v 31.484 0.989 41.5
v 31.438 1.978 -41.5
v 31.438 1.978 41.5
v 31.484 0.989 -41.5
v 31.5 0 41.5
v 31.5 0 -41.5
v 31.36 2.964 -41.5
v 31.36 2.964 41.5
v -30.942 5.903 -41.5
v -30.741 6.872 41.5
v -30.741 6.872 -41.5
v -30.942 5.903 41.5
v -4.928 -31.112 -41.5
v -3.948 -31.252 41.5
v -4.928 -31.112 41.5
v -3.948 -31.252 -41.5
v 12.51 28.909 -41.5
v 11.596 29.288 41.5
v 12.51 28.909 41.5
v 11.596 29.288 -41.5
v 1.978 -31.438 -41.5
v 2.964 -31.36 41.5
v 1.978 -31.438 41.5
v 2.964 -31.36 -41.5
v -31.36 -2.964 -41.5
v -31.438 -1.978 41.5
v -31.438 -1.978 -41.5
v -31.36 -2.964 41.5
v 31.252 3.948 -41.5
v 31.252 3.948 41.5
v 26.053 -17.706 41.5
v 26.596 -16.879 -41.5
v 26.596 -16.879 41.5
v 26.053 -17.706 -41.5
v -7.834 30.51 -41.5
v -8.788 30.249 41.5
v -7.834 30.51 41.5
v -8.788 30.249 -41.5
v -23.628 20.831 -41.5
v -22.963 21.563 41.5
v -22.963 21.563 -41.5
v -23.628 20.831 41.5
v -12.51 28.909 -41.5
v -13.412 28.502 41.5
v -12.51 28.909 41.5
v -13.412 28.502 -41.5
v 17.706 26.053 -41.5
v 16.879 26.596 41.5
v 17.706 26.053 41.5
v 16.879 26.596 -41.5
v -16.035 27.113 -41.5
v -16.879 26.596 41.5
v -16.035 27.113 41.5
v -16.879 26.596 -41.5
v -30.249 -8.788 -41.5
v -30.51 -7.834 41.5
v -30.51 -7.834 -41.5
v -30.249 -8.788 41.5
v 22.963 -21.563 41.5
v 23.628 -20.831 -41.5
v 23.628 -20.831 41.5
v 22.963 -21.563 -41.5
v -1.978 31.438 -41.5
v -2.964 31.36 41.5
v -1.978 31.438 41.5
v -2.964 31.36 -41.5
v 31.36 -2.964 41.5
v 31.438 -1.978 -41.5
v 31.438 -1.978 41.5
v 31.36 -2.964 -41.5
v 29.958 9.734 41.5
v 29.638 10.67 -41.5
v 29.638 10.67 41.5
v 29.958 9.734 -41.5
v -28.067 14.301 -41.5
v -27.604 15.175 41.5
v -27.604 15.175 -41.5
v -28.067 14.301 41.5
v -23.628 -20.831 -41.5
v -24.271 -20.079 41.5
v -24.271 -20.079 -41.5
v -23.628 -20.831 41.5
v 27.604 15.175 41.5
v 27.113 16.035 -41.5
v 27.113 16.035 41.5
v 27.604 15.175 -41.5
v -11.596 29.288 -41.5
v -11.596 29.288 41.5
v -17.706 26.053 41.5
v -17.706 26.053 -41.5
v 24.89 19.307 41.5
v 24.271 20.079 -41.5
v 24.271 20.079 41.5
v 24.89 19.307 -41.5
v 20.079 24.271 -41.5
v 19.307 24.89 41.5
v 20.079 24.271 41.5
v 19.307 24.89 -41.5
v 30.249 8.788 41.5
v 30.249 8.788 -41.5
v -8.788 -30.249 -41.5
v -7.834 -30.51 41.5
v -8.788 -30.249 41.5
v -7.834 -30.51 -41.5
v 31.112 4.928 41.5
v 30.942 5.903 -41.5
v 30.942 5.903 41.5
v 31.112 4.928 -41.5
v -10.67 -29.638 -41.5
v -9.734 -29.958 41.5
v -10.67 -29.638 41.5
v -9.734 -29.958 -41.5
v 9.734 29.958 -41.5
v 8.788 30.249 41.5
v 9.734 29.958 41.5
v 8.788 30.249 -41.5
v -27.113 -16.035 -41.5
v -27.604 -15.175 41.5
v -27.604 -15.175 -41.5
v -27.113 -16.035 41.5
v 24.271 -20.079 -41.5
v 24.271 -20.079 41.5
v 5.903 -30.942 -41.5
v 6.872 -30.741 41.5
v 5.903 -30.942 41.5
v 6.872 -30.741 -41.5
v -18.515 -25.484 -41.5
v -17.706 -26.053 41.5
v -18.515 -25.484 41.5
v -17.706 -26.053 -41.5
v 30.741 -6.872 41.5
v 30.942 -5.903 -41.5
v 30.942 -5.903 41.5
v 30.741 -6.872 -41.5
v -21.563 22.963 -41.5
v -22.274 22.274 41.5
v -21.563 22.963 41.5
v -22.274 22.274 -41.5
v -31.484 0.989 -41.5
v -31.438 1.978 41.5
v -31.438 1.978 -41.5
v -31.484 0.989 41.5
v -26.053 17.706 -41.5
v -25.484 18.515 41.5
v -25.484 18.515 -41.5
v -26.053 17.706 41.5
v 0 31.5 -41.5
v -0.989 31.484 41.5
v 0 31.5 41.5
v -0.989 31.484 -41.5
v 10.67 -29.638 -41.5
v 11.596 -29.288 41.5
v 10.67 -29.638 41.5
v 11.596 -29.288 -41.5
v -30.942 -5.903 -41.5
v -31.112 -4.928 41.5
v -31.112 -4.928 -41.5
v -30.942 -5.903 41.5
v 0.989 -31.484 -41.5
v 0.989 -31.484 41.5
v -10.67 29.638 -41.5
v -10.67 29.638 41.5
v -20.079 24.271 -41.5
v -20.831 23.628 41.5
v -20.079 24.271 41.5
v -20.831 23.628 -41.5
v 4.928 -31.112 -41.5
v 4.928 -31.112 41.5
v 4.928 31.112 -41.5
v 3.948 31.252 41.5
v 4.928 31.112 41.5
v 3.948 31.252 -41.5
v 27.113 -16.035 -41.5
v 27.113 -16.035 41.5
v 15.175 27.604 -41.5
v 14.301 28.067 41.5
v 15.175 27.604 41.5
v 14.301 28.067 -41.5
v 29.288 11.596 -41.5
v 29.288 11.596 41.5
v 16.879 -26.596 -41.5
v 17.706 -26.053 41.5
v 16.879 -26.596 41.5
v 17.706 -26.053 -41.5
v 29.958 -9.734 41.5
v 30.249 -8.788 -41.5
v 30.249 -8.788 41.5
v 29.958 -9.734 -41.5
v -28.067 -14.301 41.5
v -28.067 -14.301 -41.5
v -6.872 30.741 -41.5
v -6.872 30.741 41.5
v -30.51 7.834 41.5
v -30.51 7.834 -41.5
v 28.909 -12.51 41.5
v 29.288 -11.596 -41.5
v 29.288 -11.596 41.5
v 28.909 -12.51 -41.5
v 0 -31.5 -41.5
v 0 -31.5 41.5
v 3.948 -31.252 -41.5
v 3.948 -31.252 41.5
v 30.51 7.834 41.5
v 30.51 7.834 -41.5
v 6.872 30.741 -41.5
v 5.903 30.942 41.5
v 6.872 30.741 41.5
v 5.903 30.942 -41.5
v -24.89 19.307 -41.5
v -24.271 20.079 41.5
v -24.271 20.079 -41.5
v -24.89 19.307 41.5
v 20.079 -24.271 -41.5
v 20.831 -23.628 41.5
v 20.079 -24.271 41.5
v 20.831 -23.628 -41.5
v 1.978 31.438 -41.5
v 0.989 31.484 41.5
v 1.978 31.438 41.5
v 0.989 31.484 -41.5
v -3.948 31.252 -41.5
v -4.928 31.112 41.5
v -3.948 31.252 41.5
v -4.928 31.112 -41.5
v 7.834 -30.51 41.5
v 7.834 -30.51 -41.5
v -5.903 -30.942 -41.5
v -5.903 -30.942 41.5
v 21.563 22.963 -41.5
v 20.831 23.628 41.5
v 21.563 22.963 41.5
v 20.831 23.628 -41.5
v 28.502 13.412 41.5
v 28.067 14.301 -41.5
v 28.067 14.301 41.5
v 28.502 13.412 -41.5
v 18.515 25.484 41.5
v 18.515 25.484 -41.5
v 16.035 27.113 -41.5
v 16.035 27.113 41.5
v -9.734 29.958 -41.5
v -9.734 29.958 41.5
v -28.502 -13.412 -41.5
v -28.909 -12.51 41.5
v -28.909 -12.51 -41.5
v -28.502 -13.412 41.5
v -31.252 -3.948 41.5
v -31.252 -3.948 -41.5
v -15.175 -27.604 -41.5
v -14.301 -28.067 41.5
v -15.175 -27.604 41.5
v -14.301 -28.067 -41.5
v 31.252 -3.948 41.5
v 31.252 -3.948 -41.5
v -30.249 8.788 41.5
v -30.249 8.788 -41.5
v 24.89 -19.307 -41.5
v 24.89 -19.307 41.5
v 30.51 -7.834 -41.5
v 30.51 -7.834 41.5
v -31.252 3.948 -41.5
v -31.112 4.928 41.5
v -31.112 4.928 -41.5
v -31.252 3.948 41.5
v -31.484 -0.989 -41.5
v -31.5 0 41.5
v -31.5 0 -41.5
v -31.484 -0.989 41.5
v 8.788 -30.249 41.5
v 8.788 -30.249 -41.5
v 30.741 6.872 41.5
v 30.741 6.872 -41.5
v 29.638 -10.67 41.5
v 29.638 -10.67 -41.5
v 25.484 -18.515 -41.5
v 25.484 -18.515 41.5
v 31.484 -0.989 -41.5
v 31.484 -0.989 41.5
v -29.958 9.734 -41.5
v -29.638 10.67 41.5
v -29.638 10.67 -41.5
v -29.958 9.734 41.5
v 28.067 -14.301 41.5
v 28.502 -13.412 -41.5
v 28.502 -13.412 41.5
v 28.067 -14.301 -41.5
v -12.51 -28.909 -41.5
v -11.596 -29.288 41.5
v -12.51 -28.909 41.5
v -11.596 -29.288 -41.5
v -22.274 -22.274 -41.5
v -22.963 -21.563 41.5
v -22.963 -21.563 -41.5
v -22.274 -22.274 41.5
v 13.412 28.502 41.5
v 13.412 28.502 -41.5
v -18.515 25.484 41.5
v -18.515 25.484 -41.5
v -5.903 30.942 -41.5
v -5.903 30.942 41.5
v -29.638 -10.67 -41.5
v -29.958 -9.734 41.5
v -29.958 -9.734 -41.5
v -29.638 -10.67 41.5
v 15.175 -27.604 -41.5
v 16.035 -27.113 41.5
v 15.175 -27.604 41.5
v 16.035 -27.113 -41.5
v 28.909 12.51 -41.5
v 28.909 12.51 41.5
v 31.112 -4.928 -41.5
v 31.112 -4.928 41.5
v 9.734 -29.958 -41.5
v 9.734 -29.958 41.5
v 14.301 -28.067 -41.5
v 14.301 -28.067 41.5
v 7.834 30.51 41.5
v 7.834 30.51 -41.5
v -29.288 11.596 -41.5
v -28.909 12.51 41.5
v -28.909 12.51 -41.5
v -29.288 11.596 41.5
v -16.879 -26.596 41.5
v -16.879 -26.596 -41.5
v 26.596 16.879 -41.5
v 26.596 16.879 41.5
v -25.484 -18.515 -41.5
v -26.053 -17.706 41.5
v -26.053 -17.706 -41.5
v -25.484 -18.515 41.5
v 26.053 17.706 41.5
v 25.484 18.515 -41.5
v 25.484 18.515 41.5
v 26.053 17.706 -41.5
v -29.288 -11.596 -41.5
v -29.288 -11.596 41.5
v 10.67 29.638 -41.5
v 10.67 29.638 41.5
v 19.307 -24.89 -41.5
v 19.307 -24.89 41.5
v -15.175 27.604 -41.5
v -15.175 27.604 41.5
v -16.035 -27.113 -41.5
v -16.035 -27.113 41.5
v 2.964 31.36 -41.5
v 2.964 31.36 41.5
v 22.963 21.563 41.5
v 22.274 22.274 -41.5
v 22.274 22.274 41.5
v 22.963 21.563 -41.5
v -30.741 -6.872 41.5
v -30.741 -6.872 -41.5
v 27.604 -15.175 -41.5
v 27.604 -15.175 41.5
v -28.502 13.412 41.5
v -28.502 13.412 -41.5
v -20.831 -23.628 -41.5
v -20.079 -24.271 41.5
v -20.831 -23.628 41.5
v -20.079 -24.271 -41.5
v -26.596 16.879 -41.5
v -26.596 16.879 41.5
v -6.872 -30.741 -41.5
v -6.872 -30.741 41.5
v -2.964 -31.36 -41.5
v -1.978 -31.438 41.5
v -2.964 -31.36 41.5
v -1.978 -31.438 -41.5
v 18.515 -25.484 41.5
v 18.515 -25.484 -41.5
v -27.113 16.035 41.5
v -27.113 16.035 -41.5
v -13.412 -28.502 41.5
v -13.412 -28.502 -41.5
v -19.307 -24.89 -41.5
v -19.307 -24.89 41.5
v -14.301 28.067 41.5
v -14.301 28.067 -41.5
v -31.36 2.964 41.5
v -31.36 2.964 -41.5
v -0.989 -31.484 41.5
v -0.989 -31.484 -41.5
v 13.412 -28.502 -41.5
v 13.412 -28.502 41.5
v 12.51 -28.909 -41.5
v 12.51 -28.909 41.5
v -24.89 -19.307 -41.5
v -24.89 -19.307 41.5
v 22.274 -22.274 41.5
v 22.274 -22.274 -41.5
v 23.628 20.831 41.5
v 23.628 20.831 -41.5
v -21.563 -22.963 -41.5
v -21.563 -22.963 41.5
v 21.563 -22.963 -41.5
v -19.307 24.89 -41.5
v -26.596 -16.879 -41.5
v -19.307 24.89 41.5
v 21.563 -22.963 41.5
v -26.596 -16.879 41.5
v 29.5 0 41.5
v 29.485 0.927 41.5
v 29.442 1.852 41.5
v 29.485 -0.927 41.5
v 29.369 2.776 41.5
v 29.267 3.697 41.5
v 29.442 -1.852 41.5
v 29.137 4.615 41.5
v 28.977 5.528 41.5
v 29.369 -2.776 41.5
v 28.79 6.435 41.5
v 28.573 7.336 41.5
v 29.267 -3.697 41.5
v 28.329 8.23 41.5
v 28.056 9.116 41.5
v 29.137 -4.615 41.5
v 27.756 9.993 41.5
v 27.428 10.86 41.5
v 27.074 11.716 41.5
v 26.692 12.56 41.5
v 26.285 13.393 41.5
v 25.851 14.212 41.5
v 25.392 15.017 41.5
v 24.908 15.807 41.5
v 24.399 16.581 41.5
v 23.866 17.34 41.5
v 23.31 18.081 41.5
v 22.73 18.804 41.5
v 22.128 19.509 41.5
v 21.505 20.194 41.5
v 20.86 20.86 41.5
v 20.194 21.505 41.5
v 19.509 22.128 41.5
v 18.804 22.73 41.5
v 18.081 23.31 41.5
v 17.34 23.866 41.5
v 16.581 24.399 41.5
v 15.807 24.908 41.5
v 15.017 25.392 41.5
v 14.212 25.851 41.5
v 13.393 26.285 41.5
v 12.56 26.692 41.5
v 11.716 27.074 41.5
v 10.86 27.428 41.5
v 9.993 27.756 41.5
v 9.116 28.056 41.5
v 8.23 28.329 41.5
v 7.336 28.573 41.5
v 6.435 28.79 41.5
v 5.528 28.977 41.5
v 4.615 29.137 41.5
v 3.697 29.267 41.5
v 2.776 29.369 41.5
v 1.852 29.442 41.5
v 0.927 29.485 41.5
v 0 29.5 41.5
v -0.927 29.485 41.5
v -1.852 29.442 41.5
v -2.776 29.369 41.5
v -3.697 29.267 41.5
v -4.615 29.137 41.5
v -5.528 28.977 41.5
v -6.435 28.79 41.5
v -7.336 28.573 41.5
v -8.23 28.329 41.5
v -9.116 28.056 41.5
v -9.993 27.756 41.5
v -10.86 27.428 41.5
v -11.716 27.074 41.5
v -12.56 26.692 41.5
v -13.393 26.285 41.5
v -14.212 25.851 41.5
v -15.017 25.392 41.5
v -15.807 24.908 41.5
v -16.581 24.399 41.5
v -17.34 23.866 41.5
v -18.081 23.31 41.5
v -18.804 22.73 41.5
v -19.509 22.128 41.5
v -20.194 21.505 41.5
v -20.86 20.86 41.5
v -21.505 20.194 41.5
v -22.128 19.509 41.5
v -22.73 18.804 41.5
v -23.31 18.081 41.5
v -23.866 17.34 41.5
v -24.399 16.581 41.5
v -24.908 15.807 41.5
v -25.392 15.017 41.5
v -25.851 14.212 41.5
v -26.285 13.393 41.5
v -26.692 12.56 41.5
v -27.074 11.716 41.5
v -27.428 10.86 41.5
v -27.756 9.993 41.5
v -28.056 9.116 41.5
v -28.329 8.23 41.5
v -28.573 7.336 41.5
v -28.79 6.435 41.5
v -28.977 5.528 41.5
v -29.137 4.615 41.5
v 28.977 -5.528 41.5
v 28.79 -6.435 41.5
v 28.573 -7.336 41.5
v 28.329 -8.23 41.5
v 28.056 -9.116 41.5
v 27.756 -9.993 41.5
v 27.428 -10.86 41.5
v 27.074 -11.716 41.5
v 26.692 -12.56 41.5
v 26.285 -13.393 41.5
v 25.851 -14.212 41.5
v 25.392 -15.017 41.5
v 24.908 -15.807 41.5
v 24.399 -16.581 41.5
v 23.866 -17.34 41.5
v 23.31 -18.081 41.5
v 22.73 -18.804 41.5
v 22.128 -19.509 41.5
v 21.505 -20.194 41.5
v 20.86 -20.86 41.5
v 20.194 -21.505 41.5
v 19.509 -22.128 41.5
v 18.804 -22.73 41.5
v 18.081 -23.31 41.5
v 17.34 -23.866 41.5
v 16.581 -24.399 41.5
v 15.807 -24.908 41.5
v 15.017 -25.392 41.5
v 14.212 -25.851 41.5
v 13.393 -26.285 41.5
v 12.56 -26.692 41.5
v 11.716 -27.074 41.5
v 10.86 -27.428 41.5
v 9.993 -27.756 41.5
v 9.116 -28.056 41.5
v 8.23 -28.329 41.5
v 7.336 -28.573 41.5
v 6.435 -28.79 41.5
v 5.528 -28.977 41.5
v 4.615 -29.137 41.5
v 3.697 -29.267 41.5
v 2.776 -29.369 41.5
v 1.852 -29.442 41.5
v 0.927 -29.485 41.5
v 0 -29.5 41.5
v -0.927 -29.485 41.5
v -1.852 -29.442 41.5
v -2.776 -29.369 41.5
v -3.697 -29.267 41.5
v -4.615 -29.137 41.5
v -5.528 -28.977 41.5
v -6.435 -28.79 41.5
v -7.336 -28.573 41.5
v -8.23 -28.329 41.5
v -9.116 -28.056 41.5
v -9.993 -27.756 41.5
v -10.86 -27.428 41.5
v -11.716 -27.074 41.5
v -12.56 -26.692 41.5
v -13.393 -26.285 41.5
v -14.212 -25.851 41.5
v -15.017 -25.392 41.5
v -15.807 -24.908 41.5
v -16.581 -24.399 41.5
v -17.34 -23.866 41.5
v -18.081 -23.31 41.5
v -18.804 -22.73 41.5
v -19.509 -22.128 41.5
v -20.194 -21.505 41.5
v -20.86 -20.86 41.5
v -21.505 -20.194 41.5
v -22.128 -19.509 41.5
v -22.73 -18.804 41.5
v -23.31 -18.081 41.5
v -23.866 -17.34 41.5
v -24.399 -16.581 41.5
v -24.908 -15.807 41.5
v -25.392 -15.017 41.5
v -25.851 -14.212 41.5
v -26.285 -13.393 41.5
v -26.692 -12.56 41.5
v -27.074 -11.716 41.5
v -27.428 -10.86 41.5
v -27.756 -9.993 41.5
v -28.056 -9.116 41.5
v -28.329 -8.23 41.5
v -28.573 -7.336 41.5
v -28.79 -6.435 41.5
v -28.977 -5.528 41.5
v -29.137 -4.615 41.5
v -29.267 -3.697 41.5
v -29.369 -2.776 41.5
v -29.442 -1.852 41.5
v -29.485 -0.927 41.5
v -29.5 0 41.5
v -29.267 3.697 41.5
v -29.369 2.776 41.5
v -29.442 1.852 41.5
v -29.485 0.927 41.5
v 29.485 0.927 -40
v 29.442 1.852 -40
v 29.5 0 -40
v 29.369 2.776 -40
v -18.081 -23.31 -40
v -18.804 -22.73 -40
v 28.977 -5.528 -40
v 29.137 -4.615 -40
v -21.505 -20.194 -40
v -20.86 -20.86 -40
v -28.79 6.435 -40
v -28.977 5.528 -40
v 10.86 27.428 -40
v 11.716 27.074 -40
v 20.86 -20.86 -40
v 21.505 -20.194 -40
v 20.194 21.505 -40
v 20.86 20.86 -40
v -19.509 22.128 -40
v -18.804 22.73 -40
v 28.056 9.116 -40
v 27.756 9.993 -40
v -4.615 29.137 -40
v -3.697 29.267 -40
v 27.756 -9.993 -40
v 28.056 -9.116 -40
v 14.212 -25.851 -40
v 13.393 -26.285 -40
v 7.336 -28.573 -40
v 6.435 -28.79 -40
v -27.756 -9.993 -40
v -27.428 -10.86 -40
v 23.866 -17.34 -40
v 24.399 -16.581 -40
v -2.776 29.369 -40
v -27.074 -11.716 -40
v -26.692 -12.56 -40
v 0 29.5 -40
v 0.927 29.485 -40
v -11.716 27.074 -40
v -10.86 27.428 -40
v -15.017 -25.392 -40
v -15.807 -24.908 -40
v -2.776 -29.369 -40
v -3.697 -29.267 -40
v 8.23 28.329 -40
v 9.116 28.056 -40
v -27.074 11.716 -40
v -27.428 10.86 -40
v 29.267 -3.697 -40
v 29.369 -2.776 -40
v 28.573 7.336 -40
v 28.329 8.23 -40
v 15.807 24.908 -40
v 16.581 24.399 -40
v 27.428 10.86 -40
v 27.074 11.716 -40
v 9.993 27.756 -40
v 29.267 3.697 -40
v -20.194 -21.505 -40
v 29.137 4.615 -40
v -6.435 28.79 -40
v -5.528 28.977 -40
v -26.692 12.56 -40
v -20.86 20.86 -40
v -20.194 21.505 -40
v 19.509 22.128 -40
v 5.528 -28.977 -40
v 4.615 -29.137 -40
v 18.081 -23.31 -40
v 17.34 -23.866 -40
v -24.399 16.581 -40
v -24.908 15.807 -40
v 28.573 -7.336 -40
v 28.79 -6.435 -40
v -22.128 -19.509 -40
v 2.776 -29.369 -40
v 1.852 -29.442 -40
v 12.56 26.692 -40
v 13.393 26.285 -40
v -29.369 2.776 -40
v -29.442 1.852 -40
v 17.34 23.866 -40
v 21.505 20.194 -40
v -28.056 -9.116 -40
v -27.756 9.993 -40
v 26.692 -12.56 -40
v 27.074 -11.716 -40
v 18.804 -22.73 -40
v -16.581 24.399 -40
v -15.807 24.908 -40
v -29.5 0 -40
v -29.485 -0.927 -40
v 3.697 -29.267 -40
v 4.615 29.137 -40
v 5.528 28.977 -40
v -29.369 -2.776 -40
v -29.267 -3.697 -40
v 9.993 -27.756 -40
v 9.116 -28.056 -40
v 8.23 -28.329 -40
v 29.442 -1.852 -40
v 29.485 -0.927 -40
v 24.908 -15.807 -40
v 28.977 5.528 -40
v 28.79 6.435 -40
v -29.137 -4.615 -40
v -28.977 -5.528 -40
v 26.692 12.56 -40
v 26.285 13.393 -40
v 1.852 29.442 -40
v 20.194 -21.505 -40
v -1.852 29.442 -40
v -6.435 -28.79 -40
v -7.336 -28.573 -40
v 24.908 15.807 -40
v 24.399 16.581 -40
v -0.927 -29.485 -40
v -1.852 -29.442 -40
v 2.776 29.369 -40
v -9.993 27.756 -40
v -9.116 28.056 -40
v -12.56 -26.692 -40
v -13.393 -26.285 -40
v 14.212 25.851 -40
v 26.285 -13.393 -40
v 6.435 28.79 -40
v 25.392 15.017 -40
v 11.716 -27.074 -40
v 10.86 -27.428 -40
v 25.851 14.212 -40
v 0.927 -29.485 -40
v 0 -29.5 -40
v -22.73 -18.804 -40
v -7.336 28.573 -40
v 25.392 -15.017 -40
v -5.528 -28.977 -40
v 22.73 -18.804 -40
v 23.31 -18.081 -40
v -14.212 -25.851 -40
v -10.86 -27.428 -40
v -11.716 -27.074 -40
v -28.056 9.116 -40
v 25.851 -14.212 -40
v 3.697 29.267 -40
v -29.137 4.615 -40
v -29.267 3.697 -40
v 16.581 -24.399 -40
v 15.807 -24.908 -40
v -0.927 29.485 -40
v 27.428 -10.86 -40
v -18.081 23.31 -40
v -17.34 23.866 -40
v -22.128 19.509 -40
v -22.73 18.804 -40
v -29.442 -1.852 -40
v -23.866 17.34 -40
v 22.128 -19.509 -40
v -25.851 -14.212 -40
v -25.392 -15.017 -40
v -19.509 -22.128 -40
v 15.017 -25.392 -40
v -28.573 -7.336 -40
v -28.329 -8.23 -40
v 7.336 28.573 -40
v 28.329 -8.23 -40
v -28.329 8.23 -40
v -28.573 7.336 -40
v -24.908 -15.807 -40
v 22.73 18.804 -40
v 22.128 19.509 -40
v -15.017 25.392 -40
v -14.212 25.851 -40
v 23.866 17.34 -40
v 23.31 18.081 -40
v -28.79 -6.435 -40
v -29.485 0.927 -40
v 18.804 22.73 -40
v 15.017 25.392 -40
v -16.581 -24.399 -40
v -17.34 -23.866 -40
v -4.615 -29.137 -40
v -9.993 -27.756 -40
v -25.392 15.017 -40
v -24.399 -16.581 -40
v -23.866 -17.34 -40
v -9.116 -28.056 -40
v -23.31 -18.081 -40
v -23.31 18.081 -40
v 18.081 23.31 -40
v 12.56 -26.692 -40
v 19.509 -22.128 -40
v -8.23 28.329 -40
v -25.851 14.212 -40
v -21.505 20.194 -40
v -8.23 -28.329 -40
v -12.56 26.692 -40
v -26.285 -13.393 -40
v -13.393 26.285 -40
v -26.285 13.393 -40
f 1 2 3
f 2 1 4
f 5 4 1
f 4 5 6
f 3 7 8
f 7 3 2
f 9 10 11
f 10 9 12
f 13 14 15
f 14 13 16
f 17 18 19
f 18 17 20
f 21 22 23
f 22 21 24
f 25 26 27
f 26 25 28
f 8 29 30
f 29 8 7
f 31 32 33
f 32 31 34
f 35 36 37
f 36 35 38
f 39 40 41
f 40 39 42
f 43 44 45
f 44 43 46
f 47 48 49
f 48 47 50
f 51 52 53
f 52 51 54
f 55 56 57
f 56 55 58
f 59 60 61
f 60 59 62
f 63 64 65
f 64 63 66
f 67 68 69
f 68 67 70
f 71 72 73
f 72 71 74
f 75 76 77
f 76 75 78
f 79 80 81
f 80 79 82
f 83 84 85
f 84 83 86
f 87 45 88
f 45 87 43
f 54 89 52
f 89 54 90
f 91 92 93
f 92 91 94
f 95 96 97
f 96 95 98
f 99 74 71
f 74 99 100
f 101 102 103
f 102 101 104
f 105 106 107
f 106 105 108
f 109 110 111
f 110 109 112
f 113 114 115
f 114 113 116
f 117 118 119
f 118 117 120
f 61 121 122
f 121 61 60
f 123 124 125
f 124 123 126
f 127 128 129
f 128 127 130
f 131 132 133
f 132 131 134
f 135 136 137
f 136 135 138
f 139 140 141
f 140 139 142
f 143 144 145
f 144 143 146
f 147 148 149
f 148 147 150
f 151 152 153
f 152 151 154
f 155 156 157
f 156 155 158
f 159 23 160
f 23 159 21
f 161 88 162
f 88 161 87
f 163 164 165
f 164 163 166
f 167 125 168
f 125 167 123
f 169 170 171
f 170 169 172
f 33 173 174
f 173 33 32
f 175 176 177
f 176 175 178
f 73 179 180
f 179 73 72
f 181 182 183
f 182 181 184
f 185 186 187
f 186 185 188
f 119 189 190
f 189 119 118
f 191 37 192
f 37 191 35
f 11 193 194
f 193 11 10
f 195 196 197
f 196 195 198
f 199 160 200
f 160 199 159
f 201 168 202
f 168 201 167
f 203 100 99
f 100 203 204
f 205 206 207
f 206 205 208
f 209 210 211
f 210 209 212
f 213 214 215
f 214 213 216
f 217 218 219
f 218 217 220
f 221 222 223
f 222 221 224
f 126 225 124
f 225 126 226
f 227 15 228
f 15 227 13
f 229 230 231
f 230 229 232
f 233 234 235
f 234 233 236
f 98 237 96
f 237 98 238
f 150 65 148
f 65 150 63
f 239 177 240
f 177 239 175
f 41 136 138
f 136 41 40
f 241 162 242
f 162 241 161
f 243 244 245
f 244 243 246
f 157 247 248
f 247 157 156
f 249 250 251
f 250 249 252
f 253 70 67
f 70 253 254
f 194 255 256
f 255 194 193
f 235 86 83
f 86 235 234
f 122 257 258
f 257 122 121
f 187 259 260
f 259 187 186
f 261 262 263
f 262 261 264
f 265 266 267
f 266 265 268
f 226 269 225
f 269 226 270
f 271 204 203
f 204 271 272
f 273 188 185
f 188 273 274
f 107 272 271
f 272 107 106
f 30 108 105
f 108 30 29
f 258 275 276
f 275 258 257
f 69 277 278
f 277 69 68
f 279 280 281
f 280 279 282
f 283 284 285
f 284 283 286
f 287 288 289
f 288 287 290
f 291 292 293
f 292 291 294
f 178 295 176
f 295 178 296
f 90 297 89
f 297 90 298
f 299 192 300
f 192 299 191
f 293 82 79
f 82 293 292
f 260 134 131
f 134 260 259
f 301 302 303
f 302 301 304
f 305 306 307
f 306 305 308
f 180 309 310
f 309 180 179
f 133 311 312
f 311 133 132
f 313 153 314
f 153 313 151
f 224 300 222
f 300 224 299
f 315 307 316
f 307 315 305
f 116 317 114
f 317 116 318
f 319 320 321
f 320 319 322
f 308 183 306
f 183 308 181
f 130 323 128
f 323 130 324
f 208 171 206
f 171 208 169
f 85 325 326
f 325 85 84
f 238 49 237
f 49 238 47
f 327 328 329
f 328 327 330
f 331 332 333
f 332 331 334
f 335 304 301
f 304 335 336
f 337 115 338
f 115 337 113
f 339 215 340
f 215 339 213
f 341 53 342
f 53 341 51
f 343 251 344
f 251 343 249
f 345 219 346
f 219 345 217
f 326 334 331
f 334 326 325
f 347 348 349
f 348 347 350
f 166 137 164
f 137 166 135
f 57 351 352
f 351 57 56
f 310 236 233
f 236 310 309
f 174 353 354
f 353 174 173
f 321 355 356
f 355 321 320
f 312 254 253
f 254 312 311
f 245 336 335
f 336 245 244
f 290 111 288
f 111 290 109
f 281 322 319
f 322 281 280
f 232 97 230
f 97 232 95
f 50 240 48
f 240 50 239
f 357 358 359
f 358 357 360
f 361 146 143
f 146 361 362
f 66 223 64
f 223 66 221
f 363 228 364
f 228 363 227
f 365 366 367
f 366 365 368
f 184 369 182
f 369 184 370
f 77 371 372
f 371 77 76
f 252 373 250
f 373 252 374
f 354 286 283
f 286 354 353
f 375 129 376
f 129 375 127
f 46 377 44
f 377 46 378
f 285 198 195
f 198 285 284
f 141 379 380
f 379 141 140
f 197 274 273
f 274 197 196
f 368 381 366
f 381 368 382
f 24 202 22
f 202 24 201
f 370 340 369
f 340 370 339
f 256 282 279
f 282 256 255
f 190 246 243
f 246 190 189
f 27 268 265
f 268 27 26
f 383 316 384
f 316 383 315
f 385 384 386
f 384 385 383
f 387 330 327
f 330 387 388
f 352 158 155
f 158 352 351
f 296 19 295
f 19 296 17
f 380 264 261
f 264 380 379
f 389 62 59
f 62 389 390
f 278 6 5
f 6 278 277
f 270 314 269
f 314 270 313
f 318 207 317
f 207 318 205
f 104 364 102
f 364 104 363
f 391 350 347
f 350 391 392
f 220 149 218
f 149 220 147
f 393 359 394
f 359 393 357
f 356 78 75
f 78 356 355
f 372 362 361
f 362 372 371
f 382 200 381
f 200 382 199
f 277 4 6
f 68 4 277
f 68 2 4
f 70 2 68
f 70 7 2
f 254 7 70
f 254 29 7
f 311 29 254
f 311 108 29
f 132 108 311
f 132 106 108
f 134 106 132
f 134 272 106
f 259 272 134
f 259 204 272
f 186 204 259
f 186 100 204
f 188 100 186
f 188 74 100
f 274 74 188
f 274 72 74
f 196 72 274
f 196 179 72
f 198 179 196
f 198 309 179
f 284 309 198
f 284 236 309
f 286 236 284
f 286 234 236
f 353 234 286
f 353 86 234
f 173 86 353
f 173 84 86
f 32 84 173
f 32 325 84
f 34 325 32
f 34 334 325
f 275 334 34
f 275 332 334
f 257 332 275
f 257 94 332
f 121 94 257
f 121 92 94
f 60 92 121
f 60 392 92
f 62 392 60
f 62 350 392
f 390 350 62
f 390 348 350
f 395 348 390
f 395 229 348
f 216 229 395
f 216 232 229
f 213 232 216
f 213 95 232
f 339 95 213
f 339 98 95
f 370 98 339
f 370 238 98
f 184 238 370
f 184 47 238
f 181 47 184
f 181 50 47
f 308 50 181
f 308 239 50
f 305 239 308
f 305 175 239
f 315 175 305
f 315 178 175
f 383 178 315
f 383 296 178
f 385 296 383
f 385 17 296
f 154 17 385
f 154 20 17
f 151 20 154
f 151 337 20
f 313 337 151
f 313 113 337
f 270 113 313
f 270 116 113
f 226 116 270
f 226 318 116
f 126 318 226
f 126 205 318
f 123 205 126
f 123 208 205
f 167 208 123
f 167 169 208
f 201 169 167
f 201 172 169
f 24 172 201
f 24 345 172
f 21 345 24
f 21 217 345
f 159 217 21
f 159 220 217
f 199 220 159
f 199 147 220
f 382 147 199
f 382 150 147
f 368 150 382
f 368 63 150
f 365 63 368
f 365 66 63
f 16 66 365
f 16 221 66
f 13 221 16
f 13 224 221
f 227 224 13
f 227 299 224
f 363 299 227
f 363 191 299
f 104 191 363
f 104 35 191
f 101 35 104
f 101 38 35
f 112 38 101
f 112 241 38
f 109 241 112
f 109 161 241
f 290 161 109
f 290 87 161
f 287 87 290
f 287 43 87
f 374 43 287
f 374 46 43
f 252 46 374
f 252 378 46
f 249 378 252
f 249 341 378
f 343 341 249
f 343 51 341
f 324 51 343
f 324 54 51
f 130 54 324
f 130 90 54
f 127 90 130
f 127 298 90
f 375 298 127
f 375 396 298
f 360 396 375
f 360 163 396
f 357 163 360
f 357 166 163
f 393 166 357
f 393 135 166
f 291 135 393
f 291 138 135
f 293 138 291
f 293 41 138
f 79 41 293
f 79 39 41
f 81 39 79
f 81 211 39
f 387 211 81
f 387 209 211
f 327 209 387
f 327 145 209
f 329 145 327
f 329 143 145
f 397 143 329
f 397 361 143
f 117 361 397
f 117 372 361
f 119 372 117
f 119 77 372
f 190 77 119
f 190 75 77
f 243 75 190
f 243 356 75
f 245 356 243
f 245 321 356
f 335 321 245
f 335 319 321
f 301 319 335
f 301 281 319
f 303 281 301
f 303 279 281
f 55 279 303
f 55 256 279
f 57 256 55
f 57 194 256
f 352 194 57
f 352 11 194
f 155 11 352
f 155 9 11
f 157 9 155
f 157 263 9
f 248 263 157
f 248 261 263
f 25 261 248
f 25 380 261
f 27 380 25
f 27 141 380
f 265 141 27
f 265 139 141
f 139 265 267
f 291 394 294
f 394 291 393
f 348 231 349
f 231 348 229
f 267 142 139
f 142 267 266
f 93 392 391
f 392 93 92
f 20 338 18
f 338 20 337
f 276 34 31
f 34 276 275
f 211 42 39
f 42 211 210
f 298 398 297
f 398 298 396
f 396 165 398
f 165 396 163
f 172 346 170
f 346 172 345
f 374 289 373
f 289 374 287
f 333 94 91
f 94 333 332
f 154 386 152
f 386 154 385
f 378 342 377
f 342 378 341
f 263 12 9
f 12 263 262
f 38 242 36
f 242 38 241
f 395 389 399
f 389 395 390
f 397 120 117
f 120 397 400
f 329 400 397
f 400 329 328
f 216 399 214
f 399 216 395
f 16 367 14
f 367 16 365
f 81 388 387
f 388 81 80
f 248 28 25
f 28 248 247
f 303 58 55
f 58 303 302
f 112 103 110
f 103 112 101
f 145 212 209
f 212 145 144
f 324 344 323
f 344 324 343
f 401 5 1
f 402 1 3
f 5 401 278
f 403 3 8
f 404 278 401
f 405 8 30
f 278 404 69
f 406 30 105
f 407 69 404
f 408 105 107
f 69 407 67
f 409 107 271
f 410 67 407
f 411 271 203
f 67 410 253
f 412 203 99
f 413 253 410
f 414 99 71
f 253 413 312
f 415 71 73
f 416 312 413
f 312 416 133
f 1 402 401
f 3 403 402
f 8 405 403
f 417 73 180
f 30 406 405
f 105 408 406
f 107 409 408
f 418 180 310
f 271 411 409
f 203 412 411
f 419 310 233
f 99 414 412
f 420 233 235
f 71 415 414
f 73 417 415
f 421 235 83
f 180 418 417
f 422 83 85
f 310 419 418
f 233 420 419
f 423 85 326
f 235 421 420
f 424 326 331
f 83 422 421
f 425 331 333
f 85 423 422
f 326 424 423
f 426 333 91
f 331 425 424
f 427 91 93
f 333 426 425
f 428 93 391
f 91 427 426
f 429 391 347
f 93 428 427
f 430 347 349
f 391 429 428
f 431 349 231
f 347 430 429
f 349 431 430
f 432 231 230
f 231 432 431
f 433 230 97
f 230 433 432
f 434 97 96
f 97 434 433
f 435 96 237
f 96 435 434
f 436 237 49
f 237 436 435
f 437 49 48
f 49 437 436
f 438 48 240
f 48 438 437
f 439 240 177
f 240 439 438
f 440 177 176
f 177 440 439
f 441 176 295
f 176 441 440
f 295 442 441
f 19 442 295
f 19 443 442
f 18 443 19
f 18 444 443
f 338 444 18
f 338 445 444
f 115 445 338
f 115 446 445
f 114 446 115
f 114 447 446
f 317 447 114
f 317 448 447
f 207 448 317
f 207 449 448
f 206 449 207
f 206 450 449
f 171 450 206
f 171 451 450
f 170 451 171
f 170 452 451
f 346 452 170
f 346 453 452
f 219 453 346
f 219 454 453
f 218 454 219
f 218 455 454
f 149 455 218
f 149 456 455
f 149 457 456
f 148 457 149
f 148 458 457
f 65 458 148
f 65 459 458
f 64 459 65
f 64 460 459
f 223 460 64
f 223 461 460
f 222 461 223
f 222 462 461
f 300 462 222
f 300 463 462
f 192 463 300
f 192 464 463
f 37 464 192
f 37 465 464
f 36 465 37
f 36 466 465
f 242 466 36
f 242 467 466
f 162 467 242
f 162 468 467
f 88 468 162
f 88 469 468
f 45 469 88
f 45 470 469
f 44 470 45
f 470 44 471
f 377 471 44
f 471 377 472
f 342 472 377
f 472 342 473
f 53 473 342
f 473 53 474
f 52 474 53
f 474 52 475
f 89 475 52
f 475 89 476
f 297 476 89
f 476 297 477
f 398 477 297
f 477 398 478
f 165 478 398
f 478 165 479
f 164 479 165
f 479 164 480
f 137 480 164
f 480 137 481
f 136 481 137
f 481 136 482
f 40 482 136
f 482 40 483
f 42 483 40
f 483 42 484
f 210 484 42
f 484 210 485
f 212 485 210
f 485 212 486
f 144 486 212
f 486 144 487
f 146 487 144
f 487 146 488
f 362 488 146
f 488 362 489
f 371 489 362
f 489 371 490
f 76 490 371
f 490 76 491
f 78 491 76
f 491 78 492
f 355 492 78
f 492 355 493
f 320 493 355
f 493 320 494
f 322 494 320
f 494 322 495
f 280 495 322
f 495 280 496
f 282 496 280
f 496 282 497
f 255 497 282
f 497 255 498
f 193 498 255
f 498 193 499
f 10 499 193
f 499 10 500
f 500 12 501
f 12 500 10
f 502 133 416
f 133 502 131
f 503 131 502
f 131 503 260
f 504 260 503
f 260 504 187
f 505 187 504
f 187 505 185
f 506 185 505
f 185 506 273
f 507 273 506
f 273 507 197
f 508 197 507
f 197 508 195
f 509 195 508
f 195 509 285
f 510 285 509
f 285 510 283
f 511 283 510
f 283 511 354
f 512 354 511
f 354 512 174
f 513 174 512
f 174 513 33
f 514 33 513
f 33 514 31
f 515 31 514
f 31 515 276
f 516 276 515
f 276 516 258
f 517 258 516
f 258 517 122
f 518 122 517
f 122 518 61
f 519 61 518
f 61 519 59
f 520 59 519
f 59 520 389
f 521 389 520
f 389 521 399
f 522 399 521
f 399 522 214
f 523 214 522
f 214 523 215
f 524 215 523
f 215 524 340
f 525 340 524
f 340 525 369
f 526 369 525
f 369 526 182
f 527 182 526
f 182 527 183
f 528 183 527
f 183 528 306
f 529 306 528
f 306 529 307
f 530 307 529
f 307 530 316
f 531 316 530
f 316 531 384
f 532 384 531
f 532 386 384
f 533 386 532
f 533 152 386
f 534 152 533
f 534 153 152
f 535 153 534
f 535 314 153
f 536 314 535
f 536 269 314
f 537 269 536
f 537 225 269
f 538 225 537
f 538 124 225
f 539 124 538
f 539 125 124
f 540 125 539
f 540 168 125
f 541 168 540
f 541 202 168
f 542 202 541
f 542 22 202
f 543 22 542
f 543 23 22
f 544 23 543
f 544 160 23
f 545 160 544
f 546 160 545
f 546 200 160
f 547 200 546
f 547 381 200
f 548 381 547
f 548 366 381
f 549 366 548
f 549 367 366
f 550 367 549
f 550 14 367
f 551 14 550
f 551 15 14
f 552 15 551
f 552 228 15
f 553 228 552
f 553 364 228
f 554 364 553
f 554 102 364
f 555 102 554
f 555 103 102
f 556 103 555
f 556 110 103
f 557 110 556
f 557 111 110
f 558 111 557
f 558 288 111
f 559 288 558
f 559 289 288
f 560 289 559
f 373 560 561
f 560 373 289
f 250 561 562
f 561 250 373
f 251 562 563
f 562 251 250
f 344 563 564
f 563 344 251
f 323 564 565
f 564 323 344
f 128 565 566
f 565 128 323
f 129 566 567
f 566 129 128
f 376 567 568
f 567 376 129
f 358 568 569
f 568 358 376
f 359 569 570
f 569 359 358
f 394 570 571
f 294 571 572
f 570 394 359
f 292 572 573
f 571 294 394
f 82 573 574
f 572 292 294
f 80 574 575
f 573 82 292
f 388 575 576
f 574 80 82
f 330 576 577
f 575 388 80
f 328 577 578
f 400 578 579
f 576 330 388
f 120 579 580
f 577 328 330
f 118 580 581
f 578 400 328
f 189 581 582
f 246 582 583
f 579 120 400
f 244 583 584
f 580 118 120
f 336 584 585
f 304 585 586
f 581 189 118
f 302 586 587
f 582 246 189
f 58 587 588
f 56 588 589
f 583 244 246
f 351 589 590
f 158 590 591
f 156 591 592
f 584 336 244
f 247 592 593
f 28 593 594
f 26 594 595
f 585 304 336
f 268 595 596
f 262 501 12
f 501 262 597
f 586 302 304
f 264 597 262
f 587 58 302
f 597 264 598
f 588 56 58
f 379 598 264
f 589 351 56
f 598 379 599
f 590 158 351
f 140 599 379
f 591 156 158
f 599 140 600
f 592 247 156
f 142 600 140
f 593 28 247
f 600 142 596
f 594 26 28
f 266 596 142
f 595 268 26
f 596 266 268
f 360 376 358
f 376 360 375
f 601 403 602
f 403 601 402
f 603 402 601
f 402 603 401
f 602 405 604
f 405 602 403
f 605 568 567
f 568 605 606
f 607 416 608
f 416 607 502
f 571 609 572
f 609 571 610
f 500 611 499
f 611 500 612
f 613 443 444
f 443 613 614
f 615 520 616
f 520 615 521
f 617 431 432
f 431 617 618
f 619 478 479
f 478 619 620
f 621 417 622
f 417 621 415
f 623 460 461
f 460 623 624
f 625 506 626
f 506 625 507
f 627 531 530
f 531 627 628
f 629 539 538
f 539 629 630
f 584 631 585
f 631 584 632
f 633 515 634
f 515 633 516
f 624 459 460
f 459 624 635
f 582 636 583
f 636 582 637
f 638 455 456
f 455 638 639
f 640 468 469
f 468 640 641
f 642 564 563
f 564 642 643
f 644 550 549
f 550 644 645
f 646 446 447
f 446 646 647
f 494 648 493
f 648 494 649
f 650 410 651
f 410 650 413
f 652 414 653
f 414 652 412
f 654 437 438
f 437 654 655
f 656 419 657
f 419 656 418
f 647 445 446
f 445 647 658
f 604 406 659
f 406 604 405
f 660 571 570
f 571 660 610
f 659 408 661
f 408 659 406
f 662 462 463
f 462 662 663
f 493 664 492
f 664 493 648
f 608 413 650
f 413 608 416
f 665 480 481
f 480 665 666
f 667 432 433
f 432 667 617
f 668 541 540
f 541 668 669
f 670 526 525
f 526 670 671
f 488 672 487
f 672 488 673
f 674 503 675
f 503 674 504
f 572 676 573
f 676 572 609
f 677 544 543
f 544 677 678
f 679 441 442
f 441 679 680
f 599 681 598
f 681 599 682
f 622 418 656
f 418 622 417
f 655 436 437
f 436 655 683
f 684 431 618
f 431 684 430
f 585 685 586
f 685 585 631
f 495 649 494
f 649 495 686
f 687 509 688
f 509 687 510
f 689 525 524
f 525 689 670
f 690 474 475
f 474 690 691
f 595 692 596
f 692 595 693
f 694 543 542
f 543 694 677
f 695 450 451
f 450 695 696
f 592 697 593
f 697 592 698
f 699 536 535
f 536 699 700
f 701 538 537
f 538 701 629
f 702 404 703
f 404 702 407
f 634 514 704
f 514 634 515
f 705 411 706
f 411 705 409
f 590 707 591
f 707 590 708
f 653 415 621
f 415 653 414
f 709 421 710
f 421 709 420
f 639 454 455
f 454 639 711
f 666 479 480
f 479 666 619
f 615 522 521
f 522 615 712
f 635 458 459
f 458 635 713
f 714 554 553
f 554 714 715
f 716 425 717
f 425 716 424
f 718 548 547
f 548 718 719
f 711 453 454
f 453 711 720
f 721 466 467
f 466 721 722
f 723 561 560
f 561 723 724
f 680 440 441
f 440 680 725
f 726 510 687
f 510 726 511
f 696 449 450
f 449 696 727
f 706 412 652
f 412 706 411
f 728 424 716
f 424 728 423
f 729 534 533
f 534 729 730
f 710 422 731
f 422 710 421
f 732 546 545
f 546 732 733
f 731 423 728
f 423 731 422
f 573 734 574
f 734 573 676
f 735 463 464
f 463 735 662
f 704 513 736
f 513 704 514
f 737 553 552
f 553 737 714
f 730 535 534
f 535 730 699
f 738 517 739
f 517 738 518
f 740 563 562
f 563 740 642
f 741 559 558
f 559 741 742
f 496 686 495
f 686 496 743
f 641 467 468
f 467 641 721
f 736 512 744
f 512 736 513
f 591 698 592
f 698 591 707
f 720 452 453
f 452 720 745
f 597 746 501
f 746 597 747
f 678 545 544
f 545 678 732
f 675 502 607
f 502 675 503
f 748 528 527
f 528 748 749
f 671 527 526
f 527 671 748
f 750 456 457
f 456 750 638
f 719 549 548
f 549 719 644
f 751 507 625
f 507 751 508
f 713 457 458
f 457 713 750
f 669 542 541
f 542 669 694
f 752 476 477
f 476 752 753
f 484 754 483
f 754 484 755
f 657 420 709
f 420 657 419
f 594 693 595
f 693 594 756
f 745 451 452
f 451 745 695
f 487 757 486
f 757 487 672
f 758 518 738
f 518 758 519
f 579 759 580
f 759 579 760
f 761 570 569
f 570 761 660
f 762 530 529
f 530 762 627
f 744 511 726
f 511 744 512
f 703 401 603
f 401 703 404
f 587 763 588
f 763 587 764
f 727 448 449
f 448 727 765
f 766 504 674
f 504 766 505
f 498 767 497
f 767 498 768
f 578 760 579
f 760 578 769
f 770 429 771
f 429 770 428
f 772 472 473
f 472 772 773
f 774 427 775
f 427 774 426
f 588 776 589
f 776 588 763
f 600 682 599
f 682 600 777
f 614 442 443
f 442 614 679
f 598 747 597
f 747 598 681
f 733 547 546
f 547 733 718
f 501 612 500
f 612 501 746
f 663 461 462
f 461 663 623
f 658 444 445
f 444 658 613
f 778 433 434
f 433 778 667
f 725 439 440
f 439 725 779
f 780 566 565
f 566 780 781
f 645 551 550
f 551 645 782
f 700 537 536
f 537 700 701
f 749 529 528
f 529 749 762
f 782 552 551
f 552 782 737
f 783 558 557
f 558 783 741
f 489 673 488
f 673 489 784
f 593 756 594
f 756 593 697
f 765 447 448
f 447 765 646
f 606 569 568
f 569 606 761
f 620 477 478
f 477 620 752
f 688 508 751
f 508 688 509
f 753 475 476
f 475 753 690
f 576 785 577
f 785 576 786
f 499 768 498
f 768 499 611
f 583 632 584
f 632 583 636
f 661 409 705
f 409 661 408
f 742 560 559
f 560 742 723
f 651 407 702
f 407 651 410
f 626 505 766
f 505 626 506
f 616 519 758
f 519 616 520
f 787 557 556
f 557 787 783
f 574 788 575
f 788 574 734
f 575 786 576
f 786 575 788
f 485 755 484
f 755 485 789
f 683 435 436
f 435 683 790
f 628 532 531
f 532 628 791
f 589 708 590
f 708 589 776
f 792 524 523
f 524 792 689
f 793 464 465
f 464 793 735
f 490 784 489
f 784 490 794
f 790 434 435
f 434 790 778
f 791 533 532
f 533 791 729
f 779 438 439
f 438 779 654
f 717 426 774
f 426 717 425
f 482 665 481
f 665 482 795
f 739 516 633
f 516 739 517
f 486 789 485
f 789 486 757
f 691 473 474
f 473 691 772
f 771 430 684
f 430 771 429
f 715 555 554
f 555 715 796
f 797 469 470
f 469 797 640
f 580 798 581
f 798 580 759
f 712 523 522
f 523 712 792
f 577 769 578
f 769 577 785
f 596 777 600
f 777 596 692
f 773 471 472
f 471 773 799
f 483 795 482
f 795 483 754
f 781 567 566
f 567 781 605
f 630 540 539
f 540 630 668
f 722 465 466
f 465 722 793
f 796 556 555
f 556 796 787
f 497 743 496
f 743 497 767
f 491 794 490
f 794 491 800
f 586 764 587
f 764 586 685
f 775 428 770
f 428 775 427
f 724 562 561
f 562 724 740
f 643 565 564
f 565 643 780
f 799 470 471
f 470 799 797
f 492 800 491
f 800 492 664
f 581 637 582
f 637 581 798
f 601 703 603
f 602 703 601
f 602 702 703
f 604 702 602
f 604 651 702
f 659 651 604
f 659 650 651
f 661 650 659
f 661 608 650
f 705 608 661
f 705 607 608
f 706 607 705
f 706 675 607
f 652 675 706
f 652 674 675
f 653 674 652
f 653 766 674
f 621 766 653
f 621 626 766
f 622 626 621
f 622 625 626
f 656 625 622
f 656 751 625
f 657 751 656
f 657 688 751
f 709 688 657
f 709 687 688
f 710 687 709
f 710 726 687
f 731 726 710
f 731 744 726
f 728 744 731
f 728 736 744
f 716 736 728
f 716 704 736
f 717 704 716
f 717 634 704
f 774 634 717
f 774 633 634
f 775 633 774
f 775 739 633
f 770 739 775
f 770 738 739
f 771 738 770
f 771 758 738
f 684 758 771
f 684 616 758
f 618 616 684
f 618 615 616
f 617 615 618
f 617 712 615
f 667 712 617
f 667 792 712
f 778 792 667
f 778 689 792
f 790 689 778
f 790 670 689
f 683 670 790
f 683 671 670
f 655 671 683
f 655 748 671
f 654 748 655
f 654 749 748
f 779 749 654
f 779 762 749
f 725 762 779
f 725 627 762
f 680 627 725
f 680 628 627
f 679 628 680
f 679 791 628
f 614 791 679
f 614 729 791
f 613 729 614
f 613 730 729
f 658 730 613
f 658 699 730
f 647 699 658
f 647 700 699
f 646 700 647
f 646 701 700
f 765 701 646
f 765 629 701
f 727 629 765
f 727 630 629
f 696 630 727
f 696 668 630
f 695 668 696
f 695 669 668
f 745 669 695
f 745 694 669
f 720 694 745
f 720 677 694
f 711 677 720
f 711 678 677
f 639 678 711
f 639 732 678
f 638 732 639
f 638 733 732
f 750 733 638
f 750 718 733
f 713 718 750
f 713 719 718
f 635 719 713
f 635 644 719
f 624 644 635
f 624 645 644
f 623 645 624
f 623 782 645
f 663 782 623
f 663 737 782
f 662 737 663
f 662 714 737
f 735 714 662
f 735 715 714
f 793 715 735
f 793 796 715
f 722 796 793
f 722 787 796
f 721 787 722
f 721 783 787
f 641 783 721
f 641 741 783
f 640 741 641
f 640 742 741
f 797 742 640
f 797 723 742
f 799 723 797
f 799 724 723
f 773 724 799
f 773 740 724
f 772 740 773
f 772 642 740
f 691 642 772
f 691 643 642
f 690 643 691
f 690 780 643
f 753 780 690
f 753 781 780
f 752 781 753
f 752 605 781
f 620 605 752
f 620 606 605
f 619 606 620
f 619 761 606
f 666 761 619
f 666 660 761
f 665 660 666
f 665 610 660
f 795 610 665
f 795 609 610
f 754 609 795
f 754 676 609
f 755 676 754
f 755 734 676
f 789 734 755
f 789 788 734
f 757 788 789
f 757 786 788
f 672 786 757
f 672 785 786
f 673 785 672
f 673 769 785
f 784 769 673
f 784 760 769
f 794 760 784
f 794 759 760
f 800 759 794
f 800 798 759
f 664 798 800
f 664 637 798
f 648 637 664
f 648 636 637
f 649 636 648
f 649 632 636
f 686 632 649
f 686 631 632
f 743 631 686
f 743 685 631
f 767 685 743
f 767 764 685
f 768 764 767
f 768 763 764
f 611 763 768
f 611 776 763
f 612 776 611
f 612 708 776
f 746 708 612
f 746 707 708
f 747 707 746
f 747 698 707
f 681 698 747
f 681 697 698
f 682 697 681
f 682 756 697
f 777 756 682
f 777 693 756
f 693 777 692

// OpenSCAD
module outer(){
    cylinder(83,31.5,31.5,center=true,$fn=200);}

module inner(){
    translate([0,0,1])
    cylinder(82,29.5,29.5,center=true,$fn=200);}

module diff()
difference(){outer();inner();}
diff();
